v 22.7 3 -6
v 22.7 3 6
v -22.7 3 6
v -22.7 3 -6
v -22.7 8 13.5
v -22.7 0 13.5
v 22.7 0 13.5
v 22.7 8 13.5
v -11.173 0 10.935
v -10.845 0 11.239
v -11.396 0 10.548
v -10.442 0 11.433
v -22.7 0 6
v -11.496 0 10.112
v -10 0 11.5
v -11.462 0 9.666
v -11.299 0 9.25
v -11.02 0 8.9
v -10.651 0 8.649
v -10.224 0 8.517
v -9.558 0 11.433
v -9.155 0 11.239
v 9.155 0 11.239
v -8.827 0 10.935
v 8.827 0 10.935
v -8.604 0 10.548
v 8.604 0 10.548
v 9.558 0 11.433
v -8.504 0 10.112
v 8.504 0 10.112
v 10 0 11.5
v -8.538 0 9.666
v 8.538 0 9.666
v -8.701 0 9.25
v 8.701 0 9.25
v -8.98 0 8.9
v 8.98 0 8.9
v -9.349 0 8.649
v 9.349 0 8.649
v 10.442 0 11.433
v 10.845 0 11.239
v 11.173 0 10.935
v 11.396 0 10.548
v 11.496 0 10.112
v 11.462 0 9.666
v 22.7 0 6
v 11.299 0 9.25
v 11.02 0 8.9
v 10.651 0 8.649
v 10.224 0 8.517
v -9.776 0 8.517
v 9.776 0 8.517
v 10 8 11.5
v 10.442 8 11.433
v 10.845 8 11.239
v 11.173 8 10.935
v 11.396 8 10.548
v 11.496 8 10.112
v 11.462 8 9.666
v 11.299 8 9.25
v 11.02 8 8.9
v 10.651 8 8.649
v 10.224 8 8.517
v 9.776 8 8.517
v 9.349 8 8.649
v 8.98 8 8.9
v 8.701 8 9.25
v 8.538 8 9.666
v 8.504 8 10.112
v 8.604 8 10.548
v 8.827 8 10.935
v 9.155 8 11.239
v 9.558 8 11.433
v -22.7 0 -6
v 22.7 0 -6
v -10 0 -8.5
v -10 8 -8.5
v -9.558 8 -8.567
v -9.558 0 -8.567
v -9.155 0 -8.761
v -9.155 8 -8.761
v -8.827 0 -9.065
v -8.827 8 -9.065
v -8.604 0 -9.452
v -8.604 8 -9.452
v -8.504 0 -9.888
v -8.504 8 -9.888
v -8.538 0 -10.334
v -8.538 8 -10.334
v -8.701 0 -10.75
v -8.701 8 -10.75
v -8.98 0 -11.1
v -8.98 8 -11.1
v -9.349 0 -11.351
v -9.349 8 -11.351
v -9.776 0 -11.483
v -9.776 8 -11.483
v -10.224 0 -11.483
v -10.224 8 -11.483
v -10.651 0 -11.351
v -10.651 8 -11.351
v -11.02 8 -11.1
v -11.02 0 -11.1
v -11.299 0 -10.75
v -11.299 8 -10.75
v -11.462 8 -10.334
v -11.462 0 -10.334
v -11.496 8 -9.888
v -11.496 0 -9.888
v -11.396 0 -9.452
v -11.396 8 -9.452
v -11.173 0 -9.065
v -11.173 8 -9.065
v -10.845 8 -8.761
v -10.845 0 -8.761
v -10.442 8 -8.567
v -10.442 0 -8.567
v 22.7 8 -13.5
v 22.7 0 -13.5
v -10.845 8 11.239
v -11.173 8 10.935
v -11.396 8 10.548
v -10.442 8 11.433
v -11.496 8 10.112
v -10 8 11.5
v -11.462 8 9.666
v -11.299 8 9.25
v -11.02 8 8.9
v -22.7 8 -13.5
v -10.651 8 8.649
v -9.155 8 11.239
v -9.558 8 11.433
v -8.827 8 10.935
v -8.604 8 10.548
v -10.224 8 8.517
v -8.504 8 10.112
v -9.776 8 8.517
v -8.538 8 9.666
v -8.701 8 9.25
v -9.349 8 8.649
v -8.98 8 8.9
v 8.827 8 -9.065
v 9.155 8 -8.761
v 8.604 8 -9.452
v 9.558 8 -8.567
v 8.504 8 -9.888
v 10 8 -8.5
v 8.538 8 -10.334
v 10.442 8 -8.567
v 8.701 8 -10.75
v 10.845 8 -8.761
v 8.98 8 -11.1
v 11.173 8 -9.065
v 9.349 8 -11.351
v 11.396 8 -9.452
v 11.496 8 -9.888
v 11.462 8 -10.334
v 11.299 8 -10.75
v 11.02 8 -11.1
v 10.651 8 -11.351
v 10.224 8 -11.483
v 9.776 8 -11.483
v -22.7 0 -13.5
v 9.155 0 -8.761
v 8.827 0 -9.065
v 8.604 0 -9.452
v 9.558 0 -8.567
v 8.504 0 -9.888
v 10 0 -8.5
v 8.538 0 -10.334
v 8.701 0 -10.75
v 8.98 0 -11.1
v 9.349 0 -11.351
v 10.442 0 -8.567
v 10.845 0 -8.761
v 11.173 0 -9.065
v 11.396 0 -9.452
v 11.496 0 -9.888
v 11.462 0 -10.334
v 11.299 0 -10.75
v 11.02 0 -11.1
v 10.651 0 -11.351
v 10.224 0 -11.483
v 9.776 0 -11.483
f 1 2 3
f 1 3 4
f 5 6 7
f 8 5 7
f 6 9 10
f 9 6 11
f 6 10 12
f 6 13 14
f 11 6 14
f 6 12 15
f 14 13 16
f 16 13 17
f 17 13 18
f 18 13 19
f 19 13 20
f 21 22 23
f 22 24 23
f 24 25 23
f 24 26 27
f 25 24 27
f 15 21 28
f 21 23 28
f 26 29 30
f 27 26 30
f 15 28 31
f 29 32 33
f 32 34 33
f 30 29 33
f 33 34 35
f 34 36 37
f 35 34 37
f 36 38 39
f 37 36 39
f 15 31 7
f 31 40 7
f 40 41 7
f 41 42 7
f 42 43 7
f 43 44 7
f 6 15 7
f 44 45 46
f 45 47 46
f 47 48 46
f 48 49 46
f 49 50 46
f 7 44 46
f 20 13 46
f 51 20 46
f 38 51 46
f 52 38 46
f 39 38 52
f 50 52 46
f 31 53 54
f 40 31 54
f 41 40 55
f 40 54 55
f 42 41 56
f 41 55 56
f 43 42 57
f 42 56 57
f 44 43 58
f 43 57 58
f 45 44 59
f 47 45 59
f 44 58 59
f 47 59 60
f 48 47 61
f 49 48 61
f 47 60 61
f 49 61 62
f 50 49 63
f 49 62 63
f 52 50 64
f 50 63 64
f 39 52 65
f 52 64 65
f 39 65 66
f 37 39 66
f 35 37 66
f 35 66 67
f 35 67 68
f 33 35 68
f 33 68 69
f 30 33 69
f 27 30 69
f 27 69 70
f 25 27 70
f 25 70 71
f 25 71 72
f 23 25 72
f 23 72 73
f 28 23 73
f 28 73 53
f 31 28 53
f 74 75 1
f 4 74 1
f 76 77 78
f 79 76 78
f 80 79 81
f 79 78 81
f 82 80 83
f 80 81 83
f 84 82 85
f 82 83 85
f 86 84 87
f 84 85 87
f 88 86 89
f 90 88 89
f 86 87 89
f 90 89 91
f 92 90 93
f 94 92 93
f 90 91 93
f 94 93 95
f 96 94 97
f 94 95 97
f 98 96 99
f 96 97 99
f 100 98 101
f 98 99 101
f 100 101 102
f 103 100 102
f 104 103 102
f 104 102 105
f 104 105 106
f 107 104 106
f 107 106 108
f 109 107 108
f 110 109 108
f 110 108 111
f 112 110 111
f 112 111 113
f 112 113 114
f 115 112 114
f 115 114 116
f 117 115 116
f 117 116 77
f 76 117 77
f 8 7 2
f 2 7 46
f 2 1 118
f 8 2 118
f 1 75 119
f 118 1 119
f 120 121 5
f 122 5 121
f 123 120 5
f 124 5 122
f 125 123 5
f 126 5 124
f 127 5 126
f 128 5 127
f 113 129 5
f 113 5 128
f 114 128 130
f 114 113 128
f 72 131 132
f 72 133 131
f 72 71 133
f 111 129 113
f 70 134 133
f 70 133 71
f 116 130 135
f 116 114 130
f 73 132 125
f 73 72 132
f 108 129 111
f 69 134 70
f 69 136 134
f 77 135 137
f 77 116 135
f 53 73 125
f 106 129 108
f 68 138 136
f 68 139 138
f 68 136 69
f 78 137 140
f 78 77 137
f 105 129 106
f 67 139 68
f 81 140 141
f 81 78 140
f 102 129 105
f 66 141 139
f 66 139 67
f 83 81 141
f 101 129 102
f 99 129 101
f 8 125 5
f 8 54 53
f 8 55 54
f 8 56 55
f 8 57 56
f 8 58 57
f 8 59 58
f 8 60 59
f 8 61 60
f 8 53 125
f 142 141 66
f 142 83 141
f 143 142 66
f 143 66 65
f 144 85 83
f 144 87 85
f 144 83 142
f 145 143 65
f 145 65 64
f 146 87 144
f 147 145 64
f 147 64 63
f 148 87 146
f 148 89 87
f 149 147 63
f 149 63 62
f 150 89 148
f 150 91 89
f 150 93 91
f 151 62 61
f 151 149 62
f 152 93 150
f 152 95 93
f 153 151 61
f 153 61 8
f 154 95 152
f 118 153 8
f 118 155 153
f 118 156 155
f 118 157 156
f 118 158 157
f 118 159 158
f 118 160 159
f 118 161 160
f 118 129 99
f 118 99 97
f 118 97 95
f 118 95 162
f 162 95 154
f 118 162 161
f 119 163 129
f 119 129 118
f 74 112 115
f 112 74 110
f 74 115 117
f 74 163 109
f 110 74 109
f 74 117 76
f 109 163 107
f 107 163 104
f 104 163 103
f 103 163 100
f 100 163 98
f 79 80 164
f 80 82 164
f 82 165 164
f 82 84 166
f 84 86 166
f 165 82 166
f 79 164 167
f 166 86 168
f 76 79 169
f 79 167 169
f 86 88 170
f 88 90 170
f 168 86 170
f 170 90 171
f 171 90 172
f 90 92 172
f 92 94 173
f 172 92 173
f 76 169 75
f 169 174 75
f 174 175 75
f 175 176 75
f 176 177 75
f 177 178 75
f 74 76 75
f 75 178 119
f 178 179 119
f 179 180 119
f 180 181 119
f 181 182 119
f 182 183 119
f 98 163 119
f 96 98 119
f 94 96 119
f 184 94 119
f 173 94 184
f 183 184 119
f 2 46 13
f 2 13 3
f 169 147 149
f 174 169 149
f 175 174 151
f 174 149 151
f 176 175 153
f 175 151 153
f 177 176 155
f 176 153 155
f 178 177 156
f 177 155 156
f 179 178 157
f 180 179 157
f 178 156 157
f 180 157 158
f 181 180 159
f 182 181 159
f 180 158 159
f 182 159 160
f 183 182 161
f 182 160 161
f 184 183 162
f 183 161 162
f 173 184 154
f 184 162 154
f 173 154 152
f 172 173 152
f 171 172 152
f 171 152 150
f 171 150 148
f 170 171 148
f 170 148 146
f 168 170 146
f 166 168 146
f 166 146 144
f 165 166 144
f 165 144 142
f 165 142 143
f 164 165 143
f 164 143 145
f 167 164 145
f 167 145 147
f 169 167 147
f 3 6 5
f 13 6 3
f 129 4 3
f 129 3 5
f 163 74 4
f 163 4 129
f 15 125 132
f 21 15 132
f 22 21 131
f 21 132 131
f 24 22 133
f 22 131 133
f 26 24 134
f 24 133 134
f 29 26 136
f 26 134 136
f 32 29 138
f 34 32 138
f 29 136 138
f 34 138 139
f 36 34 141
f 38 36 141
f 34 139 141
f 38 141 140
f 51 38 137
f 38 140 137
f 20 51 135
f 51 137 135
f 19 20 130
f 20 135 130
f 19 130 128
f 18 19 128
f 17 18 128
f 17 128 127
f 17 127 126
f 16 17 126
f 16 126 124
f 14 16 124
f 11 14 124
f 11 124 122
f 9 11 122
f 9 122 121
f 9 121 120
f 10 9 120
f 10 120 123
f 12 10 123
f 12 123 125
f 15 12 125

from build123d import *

# Parameters (mm, degrees)
SKETCH1_W           = 45.4
SKETCH1_H           = 27
BOSS_EXTRUDE1_DEPTH = 8
SKETCH2_W           = 12
SKETCH2_H           = 3
CUT_EXTRUDE1_DEPTH  = 49.0355077
SKETCH3_R           = 1.5
CUT_EXTRUDE2_DEPTH  = 10


with BuildPart() as part:
    # Sketch1 → Boss-Extrude1 (new body)
    with BuildSketch(Plane(origin=(0, 0, 0), x_dir=(1, 0, 0), z_dir=(0, 1, 0))):
        Rectangle(SKETCH1_W, SKETCH1_H)
    extrude(amount=BOSS_EXTRUDE1_DEPTH)

    # Sketch2 → Cut-Extrude1 (cut, through all)
    with BuildSketch(Plane(origin=(22.7, 0, 0), x_dir=(0, 0, -1), z_dir=(1, 0, 0))):
        with Locations((0, 1.5)):
            Rectangle(SKETCH2_W, SKETCH2_H)
    extrude(amount=-CUT_EXTRUDE1_DEPTH, mode=Mode.SUBTRACT)

    # Sketch3 → Cut-Extrude2 (cut)
    with BuildSketch(Plane(origin=(0, 8, 0), x_dir=(1, 0, 0), z_dir=(0, 1, 0))):
        with Locations(Location((10, -10, 0), (0, 0, 270))):
            Circle(SKETCH3_R)
        with Locations(Location((-10, -10, 0), (0, 0, 270))):
            Circle(SKETCH3_R)
        with Locations(Location((-10, 10, 0), (0, 0, 270))):
            Circle(SKETCH3_R)
        with Locations(Location((10, 10, 0), (0, 0, 270))):
            Circle(SKETCH3_R)
    extrude(amount=-CUT_EXTRUDE2_DEPTH, mode=Mode.SUBTRACT)


solid = part.part
